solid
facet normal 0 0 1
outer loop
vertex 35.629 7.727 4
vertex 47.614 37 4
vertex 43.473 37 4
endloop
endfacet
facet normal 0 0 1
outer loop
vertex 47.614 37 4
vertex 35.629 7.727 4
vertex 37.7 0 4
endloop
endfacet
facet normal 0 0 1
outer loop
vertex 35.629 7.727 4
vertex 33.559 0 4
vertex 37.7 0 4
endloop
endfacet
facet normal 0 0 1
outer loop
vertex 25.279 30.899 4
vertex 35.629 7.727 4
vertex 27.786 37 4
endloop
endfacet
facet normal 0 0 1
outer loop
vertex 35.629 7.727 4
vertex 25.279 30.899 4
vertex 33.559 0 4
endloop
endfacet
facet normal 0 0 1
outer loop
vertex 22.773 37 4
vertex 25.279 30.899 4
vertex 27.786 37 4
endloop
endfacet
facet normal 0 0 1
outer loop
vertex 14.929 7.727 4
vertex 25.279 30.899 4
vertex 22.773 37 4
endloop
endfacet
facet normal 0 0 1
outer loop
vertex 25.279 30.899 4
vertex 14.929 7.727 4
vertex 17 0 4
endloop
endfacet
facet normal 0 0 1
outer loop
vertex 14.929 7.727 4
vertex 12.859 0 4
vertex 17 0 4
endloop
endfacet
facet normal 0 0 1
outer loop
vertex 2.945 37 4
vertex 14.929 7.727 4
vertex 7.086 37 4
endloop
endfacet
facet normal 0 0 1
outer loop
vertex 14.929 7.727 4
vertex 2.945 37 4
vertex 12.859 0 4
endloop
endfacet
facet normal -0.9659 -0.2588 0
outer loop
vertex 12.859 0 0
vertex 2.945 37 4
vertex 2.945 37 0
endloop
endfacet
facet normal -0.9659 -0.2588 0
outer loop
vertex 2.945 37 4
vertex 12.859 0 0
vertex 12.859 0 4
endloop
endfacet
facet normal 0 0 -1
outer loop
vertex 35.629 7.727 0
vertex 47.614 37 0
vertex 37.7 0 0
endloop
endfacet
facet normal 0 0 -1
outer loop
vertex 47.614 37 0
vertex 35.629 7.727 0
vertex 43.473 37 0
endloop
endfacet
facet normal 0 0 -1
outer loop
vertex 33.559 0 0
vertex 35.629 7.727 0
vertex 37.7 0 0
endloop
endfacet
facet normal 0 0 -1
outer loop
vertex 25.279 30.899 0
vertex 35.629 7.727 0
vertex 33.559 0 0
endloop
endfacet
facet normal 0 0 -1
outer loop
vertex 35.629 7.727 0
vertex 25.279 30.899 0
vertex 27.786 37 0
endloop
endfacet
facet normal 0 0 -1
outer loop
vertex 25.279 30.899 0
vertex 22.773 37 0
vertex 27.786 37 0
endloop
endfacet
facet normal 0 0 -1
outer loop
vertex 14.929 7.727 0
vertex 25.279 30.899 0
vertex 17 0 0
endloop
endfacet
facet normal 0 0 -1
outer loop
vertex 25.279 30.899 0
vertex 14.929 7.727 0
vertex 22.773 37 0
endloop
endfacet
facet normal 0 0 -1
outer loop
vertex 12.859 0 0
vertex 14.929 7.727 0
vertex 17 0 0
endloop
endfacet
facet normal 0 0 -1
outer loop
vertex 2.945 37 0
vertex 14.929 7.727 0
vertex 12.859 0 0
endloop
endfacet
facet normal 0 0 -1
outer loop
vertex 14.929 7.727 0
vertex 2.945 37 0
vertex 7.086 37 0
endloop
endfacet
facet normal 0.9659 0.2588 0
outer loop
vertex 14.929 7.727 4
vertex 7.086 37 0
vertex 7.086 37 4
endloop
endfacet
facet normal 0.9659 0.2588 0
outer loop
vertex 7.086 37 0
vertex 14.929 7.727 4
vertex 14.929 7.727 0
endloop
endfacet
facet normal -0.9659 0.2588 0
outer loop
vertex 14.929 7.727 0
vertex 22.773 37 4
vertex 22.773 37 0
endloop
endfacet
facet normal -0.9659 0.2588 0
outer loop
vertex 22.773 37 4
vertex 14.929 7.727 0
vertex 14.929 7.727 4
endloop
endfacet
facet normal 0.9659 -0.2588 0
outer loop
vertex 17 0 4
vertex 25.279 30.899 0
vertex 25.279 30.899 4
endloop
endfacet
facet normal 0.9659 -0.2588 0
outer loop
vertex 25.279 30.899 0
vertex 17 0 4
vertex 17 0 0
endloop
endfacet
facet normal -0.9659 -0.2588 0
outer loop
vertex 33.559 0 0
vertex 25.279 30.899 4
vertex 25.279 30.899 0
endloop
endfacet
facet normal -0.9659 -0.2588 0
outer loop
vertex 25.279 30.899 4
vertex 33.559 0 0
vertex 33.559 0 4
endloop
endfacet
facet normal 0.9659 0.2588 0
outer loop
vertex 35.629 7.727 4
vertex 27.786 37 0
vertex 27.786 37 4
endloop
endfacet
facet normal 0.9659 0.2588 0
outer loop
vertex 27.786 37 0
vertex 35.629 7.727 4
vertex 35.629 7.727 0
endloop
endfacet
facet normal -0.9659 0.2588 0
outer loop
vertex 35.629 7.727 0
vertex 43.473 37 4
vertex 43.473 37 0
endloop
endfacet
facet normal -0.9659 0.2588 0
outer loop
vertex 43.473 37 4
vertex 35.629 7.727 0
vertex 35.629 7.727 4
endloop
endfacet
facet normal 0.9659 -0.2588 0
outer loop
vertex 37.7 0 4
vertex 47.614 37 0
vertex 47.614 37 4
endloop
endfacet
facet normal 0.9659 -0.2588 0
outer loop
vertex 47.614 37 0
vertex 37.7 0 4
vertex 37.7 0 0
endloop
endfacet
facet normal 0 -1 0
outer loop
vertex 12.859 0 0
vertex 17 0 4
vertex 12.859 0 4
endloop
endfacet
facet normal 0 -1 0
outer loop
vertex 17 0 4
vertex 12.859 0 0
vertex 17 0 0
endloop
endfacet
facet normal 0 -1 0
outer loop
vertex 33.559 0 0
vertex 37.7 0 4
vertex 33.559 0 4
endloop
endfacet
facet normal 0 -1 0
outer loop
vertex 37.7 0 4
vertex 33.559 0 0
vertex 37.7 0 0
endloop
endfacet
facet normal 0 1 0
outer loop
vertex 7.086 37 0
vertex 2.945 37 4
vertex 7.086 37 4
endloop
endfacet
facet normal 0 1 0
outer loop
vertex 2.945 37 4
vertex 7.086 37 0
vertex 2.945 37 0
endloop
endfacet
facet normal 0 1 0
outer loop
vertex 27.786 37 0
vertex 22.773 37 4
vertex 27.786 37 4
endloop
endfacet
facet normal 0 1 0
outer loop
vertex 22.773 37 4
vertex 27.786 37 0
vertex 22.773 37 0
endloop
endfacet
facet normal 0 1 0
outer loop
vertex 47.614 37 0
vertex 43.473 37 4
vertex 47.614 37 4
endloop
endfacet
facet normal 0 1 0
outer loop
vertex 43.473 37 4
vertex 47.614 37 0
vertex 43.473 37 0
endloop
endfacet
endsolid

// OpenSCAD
x=4;
difference(){
union(){
//w
translate([0,0,0])
  rotate([0,0,90])
union(){
  translate([0,-17,0]) rotate([0,0,15]) cube([40,x,x]);
  translate([0,-17,0]) rotate([0,0,-15]) cube([40,x,x]);

 translate([0,-37.7,0]) rotate([0,0,15]) cube([40,x,x]);

 translate([0,-37.7,0])
  rotate([0,0,-15]) cube([40,x,x]);
}
}
	#translate([0,-8,0]) cube([60,8,6]);
	#translate([0,37,0]) cube([60,8,6]);
}
